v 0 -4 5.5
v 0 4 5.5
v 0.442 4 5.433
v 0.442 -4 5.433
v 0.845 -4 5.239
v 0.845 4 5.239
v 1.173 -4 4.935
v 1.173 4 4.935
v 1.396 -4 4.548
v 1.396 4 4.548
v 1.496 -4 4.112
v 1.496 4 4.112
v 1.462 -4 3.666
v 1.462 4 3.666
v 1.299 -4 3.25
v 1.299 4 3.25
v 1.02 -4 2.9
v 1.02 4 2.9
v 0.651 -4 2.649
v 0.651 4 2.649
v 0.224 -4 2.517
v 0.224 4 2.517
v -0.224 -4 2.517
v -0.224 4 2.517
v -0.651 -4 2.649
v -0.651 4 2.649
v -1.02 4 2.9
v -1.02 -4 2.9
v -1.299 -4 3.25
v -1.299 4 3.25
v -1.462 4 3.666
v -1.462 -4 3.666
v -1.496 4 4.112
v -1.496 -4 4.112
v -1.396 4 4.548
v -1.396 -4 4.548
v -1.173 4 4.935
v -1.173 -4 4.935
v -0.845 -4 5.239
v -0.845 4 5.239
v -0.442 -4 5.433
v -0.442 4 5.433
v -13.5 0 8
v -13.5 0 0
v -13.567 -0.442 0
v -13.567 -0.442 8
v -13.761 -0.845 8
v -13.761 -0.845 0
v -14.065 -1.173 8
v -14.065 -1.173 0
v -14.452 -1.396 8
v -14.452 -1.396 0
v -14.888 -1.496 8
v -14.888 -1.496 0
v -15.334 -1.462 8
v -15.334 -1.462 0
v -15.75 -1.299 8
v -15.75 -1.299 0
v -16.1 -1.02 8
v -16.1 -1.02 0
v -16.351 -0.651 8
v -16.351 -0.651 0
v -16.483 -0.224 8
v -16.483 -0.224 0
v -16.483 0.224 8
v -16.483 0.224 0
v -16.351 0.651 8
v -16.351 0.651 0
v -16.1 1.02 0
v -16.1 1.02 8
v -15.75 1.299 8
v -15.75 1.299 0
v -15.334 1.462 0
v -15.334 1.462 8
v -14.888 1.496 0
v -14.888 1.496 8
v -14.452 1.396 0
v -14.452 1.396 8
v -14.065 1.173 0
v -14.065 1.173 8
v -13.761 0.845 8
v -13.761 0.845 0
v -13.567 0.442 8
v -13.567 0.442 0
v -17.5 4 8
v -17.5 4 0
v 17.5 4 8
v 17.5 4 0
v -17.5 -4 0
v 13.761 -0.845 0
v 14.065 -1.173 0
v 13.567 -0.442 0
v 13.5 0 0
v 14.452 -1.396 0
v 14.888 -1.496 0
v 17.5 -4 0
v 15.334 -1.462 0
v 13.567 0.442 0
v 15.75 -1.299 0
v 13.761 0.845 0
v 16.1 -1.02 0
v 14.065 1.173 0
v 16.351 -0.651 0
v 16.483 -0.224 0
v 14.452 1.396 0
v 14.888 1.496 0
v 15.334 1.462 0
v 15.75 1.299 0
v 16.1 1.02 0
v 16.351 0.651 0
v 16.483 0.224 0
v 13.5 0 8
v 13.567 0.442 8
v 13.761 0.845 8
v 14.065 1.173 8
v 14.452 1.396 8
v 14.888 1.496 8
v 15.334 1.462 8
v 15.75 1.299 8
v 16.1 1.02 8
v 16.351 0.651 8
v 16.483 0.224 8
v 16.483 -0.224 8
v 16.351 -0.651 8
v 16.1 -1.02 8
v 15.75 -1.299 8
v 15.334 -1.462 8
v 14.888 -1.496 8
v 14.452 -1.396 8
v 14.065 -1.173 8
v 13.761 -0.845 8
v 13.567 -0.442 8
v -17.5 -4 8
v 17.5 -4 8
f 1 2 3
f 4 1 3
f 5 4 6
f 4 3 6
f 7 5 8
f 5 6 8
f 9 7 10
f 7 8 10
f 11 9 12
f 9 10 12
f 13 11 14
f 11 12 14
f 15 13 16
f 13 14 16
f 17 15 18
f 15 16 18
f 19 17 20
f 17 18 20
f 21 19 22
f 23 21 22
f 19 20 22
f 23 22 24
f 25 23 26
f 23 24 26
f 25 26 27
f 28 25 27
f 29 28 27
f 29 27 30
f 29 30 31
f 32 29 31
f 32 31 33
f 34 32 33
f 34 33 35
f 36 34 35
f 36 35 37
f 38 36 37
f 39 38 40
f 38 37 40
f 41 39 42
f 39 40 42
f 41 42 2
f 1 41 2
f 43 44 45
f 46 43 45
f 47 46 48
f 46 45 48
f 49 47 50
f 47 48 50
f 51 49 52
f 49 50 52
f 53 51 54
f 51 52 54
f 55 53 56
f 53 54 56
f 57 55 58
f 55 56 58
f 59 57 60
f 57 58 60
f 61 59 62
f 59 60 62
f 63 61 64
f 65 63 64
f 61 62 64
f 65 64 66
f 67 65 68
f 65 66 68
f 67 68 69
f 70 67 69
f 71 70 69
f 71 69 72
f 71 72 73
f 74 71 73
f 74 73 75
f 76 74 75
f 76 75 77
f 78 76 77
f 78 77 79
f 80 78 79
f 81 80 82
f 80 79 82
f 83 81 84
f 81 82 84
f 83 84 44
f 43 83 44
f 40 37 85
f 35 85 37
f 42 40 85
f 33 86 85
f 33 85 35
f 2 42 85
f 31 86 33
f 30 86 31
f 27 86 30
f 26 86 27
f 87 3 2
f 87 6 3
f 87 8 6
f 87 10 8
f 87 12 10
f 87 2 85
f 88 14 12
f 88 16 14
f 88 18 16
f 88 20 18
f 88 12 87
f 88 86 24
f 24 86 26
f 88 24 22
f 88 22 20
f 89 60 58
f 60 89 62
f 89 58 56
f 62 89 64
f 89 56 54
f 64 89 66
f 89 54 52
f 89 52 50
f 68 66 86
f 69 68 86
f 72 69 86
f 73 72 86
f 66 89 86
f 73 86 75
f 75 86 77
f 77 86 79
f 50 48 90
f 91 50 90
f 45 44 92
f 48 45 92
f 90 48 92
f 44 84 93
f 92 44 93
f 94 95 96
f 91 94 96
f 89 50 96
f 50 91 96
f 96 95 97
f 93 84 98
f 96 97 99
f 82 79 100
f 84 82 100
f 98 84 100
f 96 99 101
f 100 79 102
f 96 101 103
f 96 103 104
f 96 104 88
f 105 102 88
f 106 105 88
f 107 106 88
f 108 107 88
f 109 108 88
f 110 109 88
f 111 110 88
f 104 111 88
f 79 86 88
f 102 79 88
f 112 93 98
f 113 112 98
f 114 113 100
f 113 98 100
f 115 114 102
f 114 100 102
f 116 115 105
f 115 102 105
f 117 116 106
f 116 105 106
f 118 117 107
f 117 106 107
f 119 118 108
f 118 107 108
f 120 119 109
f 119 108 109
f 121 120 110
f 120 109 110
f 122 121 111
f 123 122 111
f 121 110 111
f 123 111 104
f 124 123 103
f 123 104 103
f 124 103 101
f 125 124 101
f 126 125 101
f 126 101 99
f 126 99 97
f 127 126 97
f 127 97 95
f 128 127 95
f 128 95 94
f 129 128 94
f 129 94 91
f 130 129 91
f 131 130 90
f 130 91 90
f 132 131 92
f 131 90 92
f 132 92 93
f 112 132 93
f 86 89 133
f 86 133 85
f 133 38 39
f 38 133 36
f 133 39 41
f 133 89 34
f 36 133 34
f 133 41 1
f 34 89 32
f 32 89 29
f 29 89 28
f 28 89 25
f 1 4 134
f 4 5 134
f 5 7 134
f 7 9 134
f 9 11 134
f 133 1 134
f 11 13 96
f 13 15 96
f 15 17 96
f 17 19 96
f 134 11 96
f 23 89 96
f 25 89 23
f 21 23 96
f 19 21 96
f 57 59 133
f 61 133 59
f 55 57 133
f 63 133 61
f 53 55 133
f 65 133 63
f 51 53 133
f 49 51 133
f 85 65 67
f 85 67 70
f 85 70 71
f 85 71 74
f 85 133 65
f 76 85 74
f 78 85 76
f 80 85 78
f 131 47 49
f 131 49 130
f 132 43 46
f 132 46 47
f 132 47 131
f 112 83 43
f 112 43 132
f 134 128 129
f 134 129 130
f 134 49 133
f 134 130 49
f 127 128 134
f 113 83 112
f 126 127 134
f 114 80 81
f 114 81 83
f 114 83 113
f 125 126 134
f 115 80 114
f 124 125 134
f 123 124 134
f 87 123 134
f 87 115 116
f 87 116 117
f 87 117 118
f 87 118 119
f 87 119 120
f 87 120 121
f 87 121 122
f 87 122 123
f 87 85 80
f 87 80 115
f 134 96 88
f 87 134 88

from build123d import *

# Parameters (mm, degrees)
SKETCH_1_W          = 35
SKETCH_1_H          = 8
EXTRUDE_2_DEPTH     = 8
SKETCH_3_R          = 1.5
CUT_EXTRUDE_1_DEPTH = 8
SKETCH_4_R          = 1.5
CUT_EXTRUDE_2_DEPTH = 8


with BuildPart() as part:
    # 草图1 → 凸台-拉伸2 (new body)
    with BuildSketch(Plane.XY):
        Rectangle(SKETCH_1_W, SKETCH_1_H)
    extrude(amount=EXTRUDE_2_DEPTH)

    # 草图3 → 切除-拉伸1 (cut)
    with BuildSketch(Plane(origin=(0, 0, 0), x_dir=(-1, 0, 0), z_dir=(0, 0, -1))):
        with Locations((-15, 0)):
            Circle(SKETCH_3_R)
        with Locations(Location((15, 0, 0), (0, 0, 180))):
            Circle(SKETCH_3_R)
    extrude(amount=-CUT_EXTRUDE_1_DEPTH, mode=Mode.SUBTRACT)

    # 草图4 → 切除-拉伸2 (cut)
    with BuildSketch(Plane(origin=(0, 4, 0), x_dir=(1, 0, 0), z_dir=(0, 1, 0))):
        with Locations(Location((0, -4, 0), (0, 0, 270))):
            Circle(SKETCH_4_R)
    extrude(amount=-CUT_EXTRUDE_2_DEPTH, mode=Mode.SUBTRACT)


solid = part.part
